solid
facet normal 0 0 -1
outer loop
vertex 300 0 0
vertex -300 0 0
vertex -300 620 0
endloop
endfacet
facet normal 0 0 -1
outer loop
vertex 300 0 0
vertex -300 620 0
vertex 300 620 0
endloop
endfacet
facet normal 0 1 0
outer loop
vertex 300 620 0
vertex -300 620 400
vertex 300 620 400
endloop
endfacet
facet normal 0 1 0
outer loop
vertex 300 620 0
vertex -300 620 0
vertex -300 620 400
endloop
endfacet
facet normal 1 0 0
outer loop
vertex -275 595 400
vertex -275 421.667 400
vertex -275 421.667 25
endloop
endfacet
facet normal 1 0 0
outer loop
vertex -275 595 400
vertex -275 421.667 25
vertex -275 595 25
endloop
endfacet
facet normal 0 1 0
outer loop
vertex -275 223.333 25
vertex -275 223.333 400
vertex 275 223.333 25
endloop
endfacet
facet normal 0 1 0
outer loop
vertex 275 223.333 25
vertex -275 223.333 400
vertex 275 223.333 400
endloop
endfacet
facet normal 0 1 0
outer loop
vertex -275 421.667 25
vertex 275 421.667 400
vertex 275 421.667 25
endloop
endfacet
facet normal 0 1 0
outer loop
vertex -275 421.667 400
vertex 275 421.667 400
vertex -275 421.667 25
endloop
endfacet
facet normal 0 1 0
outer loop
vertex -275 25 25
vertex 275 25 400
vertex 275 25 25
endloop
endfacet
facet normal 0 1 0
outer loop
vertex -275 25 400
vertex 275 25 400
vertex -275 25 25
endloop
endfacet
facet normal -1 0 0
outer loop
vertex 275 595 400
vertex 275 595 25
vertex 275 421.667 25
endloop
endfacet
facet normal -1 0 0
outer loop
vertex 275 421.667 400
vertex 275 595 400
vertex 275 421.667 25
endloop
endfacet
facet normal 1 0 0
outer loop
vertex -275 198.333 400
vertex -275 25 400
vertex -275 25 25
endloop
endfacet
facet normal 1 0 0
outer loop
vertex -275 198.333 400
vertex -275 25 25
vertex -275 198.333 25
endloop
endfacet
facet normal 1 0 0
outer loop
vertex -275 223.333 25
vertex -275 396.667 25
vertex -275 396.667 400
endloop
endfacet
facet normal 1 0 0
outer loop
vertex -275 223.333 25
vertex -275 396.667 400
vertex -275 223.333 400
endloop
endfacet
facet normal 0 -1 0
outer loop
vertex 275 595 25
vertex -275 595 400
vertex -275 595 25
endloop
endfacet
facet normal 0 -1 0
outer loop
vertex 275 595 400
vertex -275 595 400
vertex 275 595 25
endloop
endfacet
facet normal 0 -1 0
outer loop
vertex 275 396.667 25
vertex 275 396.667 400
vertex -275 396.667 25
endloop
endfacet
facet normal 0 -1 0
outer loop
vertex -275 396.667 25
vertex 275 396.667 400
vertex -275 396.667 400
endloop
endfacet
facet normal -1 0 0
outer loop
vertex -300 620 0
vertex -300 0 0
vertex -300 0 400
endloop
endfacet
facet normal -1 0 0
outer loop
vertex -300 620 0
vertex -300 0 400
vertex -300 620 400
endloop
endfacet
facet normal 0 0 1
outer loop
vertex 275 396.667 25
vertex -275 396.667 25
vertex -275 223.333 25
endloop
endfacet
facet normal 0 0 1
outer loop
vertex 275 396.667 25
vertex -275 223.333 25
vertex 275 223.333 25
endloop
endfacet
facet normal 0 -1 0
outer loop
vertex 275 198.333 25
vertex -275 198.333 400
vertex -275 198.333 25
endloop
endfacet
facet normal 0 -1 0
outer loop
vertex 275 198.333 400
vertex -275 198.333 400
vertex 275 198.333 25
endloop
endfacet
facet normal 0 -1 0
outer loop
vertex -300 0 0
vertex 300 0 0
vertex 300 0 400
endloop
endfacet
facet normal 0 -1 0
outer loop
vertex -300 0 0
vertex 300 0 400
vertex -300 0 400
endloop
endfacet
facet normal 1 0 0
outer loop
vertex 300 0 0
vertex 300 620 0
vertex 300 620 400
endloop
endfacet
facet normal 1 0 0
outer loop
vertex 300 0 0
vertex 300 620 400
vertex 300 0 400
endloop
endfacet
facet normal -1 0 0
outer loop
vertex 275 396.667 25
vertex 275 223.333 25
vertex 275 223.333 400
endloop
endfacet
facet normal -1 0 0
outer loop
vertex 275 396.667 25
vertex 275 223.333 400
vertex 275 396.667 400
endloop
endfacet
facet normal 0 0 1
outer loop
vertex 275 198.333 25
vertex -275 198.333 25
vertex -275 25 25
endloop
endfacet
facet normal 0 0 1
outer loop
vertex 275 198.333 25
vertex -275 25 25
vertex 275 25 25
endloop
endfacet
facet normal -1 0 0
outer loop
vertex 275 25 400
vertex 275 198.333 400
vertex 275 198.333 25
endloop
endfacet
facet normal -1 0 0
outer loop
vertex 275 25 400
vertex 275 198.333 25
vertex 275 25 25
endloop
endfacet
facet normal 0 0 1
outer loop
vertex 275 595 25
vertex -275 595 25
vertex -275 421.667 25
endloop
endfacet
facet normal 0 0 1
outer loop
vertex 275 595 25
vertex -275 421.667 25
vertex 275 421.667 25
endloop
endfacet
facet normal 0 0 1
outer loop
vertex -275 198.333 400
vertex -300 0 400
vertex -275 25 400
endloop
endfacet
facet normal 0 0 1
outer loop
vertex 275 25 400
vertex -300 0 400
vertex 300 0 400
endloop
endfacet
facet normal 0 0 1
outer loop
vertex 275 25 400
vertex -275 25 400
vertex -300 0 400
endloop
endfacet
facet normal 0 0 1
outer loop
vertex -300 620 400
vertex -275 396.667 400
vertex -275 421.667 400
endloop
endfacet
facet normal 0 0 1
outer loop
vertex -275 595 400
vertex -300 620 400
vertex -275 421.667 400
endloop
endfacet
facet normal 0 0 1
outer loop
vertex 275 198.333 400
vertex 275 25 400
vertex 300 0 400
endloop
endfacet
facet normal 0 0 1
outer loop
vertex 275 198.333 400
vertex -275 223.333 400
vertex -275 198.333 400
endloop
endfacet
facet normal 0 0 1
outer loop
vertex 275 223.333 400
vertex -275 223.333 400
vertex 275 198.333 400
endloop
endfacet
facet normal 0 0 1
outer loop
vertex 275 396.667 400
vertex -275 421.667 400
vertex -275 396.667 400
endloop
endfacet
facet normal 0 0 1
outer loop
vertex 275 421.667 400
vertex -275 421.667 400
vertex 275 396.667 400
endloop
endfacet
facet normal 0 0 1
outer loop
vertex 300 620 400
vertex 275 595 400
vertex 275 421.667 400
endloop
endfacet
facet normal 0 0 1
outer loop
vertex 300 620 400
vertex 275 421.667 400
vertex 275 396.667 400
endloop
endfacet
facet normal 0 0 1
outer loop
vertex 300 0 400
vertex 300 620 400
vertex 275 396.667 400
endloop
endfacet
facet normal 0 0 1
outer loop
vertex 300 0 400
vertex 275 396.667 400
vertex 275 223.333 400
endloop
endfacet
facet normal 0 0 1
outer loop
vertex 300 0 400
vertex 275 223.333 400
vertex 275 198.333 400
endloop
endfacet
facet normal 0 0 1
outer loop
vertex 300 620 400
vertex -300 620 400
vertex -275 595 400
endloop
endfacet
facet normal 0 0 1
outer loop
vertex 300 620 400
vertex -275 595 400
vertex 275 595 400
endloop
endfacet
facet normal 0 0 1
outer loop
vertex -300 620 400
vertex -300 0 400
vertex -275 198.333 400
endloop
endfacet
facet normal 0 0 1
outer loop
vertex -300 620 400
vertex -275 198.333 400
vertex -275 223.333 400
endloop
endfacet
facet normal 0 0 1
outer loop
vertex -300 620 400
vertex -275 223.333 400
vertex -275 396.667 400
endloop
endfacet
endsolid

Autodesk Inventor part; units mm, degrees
ref_plane "YZ Plane" through (0, 0, 0) normal (1, 0, 0) x (0, 1, 0)
ref_plane "XZ Plane" through (0, 0, 0) normal (0, 1, 0) x (-1, 0, 0)
ref_plane "XY Plane" through (0, 0, 0) normal (0, 0, 1) x (1, 0, 0)
sketch "Sketch1" plane through (0, 0, 0) normal (0, 0, 1) x (1, 0, 0)
  line L0 (-300, 620) -> (300, 620)
  line L1 (300, 620) -> (300, 0)
  line L2 (300, 0) -> (-300, 0)
  line L3 (-300, 0) -> (-300, 620)
  point P0 (0, 0)
  point P1 (0, 0)
  dimension "d0" = 600
  dimension "d1" = 620
extrude "Extrusion1" add sketch "Sketch1" along normal blind 400
sketch "Sketch2" plane through (0, 0, 400) normal (0, 0, 1) x (1, 0, 0)
  line L0 (-300, 0) -> (300, 0) projected
  line L1 (300, 0) -> (300, 620) projected
  line L2 (300, 620) -> (-300, 620) projected
  line L3 (-300, 620) -> (-300, 0) projected
  line L4 (-275, 595) -> (275, 595)
  line L5 (275, 595) -> (275, 421.6667)
  line L6 (275, 421.6667) -> (-275, 421.6667)
  line L7 (-275, 421.6667) -> (-275, 595)
  line L8 (275, 396.6667) -> (-275, 396.6667)
  line L9 (-275, 396.6667) -> (-275, 223.3333)
  line L10 (-275, 223.3333) -> (275, 223.3333)
  line L11 (275, 223.3333) -> (275, 396.6667)
  line L12 (-275, 198.3333) -> (275, 198.3333)
  line L13 (275, 198.3333) -> (275, 25)
  line L14 (275, 25) -> (-275, 25)
  line L15 (-275, 25) -> (-275, 198.3333)
  line L16 (-275, 421.6667) -> (-275, 396.6667) construction
  line L17 (-275, 223.3333) -> (-275, 198.3333) construction
  line L18 (-275, 595) -> (-300, 620) construction
  line L19 (275, 595) -> (300, 620) construction
  line L20 (-275, 25) -> (-300, 0) construction
  point P0 (0, 0)
  dimension "d4" = 25
  dimension "d5" = 25
extrude "Extrusion2" cut sketch "Sketch2" against normal blind 375 contours L4 L5 L6 L7 | L11 L10 L9 L8 | L12 L13 L14 L15
equation "\"d5\" = d4"
equation "\"d6\" = d2 - d4"
equation "\"d2\" = 400"
properties part number "Pensile"
